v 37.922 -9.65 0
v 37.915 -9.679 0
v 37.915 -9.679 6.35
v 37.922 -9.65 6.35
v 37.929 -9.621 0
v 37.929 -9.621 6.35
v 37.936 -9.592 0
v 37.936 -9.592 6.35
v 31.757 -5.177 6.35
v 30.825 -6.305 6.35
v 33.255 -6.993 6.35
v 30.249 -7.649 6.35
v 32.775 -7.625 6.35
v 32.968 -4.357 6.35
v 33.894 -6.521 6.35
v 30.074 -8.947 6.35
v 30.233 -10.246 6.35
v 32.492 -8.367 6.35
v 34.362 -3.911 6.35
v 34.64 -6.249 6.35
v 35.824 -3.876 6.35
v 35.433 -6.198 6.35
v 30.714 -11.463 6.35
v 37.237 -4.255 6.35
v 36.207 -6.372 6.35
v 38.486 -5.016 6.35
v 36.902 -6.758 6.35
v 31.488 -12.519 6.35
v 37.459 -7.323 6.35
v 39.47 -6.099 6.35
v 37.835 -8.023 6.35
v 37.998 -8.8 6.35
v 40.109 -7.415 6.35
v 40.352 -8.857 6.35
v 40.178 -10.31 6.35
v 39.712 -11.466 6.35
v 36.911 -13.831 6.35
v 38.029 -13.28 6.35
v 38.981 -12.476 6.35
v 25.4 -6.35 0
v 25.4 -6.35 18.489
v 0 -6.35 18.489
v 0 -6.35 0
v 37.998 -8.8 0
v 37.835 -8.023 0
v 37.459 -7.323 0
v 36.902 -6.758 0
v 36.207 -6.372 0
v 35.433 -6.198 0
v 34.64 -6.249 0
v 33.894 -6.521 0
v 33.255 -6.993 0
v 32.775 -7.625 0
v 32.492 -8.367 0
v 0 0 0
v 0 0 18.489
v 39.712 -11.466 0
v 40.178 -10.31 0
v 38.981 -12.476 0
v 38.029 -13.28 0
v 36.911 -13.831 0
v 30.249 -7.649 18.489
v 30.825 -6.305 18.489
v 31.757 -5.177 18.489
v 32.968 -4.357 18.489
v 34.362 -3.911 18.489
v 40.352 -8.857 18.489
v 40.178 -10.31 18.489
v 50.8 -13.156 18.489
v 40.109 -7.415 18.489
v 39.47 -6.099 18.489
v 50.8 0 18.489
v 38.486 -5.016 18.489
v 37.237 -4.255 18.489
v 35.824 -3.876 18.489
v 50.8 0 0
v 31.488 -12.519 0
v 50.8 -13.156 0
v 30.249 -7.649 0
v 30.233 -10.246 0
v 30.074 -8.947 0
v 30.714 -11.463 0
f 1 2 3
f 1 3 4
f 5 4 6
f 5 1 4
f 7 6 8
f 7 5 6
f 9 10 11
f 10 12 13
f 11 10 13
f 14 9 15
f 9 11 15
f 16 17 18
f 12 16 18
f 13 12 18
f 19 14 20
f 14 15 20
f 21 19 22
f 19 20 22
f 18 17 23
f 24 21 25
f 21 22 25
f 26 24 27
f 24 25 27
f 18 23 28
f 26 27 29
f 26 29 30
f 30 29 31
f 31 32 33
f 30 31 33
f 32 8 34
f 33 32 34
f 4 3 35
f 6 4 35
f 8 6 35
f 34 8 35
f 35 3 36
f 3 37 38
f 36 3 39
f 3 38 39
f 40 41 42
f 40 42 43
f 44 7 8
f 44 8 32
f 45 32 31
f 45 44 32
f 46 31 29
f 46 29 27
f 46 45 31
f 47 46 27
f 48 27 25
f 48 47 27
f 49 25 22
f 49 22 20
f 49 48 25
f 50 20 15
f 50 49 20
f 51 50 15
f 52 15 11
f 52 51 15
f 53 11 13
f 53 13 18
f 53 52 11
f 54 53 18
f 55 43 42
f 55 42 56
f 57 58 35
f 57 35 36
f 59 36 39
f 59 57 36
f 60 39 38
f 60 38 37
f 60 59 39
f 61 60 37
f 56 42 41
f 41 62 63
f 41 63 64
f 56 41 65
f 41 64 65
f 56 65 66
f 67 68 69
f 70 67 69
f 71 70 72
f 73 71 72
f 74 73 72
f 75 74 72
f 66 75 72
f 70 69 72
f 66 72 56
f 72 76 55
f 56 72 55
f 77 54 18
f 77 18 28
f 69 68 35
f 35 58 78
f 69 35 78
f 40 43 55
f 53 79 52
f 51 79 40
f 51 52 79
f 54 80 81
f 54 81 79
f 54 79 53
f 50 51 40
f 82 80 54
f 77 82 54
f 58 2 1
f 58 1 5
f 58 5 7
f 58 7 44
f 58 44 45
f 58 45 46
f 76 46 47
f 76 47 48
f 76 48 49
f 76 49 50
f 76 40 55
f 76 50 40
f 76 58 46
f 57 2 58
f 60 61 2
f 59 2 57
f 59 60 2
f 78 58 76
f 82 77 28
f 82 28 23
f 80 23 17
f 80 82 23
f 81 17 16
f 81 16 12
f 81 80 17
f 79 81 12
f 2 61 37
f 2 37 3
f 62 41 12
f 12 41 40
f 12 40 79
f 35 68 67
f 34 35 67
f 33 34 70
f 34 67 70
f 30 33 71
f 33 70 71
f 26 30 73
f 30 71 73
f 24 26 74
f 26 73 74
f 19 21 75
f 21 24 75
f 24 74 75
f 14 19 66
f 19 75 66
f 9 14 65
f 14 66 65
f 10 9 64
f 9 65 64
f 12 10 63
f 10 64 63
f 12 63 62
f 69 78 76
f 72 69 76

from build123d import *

# Parameters (mm, degrees)
F1_DEPTH  = 25.4
F3_DEPTH  = 152.4
F4_R      = 5.1395
F5_DEPTH  = 152.401
F7_DEPTH  = 6.096
F9_DEPTH  = 6.35
F10_R     = 1.905
F11_DEPTH = 6.35
F12_W     = 46.7241909355
F12_H     = 189.791161567
F13_DEPTH = 50.801


with BuildPart() as f1:
    # F0 (on Right) → F1 (new body)
    with BuildSketch(Plane.YZ):
        Polygon((-6.35, 0), (0, 0), (0, 203.2), (-24.13, 203.2), (-24.13, 177.8), (-17.78, 177.8), (-17.78, 196.85), (-6.35, 196.85), align=None)
    extrude(amount=F1_DEPTH)

    # F2 (on Top) → F3 (join)
    with BuildSketch(Plane.XY):
        Polygon((50.8, 0), (25.4, 0), (25.4, -6.35), (50.8, -13.1559094878), align=None)
    extrude(amount=F3_DEPTH)

    # F4 (on face) → F5 (cut, through all)
    with BuildSketch(Plane.XY.offset(152.4)):
        with Locations((35.2138063951, -8.9796014982)):
            Circle(F4_R)
    extrude(amount=-F5_DEPTH, mode=Mode.SUBTRACT)

    # F6 (on face) → F7 (cut)
    with BuildSketch(Plane.YZ.offset(50.8)):
        Polygon((-9.3719547439, 71.3606500437), (-3.7839547439, 71.3606500437), (-0.9899547439, 76.2), (-3.7839547439, 81.0393499563), (-9.3719547439, 81.0393499563), (-12.1659547439, 76.2), align=None)
    extrude(amount=-F7_DEPTH, mode=Mode.SUBTRACT)

    # F8 (on face) → F9 (join)
    with BuildSketch(Plane(origin=(0, 0, 0), x_dir=(1, 0, 0), z_dir=(0, 0, -1))):
        with BuildLine():
            Line((32.4918402484, 8.3672288206), (31.4877265179, 12.5194869482))
            ThreePointArc((31.4877265179, 12.5194869482), (30.2327985505, 10.2461010452), (30.2494306109, 7.6494010159))
            ThreePointArc((30.2494306109, 7.6494010159), (36.5440068774, 4.015225714), (40.1781821793, 10.3098019805))
            ThreePointArc((40.1781821793, 10.3098019805), (38.9811201217, 12.4755716834), (36.9107028801, 13.8308902517))
            Line((36.9107028801, 13.8308902517), (37.9148166106, 9.678632124))
            ThreePointArc((37.9148166106, 9.678632124), (37.9256407477, 9.6353868624), (37.9357725418, 9.5919741759))
            ThreePointArc((37.9357725418, 9.5919741759), (35.8261790728, 6.2576353516), (32.4918402484, 8.3672288206))
        make_face()
    extrude(amount=-F9_DEPTH)

    # F10 (on face) → F11 (join)
    with BuildSketch(Plane(origin=(0.1139773719, 0.425369343, 0), x_dir=(0.9659258263, -0.2588190451, 0), z_dir=(-0.2588190451, -0.9659258263, 0))):
        with Locations((45.3620319066, 149.352)):
            Circle(F10_R)
        with Locations((49.4260319066, 145.288)):
            Circle(F10_R)
    extrude(amount=F11_DEPTH)

    # F12 (on face) → F13 (cut, through all)
    with BuildSketch(Plane.YZ.offset(50.8)):
        with Locations((-7.7233714983, 113.3844163269)):
            Rectangle(F12_W, F12_H)
    extrude(amount=-F13_DEPTH, mode=Mode.SUBTRACT)


solid = f1.part
